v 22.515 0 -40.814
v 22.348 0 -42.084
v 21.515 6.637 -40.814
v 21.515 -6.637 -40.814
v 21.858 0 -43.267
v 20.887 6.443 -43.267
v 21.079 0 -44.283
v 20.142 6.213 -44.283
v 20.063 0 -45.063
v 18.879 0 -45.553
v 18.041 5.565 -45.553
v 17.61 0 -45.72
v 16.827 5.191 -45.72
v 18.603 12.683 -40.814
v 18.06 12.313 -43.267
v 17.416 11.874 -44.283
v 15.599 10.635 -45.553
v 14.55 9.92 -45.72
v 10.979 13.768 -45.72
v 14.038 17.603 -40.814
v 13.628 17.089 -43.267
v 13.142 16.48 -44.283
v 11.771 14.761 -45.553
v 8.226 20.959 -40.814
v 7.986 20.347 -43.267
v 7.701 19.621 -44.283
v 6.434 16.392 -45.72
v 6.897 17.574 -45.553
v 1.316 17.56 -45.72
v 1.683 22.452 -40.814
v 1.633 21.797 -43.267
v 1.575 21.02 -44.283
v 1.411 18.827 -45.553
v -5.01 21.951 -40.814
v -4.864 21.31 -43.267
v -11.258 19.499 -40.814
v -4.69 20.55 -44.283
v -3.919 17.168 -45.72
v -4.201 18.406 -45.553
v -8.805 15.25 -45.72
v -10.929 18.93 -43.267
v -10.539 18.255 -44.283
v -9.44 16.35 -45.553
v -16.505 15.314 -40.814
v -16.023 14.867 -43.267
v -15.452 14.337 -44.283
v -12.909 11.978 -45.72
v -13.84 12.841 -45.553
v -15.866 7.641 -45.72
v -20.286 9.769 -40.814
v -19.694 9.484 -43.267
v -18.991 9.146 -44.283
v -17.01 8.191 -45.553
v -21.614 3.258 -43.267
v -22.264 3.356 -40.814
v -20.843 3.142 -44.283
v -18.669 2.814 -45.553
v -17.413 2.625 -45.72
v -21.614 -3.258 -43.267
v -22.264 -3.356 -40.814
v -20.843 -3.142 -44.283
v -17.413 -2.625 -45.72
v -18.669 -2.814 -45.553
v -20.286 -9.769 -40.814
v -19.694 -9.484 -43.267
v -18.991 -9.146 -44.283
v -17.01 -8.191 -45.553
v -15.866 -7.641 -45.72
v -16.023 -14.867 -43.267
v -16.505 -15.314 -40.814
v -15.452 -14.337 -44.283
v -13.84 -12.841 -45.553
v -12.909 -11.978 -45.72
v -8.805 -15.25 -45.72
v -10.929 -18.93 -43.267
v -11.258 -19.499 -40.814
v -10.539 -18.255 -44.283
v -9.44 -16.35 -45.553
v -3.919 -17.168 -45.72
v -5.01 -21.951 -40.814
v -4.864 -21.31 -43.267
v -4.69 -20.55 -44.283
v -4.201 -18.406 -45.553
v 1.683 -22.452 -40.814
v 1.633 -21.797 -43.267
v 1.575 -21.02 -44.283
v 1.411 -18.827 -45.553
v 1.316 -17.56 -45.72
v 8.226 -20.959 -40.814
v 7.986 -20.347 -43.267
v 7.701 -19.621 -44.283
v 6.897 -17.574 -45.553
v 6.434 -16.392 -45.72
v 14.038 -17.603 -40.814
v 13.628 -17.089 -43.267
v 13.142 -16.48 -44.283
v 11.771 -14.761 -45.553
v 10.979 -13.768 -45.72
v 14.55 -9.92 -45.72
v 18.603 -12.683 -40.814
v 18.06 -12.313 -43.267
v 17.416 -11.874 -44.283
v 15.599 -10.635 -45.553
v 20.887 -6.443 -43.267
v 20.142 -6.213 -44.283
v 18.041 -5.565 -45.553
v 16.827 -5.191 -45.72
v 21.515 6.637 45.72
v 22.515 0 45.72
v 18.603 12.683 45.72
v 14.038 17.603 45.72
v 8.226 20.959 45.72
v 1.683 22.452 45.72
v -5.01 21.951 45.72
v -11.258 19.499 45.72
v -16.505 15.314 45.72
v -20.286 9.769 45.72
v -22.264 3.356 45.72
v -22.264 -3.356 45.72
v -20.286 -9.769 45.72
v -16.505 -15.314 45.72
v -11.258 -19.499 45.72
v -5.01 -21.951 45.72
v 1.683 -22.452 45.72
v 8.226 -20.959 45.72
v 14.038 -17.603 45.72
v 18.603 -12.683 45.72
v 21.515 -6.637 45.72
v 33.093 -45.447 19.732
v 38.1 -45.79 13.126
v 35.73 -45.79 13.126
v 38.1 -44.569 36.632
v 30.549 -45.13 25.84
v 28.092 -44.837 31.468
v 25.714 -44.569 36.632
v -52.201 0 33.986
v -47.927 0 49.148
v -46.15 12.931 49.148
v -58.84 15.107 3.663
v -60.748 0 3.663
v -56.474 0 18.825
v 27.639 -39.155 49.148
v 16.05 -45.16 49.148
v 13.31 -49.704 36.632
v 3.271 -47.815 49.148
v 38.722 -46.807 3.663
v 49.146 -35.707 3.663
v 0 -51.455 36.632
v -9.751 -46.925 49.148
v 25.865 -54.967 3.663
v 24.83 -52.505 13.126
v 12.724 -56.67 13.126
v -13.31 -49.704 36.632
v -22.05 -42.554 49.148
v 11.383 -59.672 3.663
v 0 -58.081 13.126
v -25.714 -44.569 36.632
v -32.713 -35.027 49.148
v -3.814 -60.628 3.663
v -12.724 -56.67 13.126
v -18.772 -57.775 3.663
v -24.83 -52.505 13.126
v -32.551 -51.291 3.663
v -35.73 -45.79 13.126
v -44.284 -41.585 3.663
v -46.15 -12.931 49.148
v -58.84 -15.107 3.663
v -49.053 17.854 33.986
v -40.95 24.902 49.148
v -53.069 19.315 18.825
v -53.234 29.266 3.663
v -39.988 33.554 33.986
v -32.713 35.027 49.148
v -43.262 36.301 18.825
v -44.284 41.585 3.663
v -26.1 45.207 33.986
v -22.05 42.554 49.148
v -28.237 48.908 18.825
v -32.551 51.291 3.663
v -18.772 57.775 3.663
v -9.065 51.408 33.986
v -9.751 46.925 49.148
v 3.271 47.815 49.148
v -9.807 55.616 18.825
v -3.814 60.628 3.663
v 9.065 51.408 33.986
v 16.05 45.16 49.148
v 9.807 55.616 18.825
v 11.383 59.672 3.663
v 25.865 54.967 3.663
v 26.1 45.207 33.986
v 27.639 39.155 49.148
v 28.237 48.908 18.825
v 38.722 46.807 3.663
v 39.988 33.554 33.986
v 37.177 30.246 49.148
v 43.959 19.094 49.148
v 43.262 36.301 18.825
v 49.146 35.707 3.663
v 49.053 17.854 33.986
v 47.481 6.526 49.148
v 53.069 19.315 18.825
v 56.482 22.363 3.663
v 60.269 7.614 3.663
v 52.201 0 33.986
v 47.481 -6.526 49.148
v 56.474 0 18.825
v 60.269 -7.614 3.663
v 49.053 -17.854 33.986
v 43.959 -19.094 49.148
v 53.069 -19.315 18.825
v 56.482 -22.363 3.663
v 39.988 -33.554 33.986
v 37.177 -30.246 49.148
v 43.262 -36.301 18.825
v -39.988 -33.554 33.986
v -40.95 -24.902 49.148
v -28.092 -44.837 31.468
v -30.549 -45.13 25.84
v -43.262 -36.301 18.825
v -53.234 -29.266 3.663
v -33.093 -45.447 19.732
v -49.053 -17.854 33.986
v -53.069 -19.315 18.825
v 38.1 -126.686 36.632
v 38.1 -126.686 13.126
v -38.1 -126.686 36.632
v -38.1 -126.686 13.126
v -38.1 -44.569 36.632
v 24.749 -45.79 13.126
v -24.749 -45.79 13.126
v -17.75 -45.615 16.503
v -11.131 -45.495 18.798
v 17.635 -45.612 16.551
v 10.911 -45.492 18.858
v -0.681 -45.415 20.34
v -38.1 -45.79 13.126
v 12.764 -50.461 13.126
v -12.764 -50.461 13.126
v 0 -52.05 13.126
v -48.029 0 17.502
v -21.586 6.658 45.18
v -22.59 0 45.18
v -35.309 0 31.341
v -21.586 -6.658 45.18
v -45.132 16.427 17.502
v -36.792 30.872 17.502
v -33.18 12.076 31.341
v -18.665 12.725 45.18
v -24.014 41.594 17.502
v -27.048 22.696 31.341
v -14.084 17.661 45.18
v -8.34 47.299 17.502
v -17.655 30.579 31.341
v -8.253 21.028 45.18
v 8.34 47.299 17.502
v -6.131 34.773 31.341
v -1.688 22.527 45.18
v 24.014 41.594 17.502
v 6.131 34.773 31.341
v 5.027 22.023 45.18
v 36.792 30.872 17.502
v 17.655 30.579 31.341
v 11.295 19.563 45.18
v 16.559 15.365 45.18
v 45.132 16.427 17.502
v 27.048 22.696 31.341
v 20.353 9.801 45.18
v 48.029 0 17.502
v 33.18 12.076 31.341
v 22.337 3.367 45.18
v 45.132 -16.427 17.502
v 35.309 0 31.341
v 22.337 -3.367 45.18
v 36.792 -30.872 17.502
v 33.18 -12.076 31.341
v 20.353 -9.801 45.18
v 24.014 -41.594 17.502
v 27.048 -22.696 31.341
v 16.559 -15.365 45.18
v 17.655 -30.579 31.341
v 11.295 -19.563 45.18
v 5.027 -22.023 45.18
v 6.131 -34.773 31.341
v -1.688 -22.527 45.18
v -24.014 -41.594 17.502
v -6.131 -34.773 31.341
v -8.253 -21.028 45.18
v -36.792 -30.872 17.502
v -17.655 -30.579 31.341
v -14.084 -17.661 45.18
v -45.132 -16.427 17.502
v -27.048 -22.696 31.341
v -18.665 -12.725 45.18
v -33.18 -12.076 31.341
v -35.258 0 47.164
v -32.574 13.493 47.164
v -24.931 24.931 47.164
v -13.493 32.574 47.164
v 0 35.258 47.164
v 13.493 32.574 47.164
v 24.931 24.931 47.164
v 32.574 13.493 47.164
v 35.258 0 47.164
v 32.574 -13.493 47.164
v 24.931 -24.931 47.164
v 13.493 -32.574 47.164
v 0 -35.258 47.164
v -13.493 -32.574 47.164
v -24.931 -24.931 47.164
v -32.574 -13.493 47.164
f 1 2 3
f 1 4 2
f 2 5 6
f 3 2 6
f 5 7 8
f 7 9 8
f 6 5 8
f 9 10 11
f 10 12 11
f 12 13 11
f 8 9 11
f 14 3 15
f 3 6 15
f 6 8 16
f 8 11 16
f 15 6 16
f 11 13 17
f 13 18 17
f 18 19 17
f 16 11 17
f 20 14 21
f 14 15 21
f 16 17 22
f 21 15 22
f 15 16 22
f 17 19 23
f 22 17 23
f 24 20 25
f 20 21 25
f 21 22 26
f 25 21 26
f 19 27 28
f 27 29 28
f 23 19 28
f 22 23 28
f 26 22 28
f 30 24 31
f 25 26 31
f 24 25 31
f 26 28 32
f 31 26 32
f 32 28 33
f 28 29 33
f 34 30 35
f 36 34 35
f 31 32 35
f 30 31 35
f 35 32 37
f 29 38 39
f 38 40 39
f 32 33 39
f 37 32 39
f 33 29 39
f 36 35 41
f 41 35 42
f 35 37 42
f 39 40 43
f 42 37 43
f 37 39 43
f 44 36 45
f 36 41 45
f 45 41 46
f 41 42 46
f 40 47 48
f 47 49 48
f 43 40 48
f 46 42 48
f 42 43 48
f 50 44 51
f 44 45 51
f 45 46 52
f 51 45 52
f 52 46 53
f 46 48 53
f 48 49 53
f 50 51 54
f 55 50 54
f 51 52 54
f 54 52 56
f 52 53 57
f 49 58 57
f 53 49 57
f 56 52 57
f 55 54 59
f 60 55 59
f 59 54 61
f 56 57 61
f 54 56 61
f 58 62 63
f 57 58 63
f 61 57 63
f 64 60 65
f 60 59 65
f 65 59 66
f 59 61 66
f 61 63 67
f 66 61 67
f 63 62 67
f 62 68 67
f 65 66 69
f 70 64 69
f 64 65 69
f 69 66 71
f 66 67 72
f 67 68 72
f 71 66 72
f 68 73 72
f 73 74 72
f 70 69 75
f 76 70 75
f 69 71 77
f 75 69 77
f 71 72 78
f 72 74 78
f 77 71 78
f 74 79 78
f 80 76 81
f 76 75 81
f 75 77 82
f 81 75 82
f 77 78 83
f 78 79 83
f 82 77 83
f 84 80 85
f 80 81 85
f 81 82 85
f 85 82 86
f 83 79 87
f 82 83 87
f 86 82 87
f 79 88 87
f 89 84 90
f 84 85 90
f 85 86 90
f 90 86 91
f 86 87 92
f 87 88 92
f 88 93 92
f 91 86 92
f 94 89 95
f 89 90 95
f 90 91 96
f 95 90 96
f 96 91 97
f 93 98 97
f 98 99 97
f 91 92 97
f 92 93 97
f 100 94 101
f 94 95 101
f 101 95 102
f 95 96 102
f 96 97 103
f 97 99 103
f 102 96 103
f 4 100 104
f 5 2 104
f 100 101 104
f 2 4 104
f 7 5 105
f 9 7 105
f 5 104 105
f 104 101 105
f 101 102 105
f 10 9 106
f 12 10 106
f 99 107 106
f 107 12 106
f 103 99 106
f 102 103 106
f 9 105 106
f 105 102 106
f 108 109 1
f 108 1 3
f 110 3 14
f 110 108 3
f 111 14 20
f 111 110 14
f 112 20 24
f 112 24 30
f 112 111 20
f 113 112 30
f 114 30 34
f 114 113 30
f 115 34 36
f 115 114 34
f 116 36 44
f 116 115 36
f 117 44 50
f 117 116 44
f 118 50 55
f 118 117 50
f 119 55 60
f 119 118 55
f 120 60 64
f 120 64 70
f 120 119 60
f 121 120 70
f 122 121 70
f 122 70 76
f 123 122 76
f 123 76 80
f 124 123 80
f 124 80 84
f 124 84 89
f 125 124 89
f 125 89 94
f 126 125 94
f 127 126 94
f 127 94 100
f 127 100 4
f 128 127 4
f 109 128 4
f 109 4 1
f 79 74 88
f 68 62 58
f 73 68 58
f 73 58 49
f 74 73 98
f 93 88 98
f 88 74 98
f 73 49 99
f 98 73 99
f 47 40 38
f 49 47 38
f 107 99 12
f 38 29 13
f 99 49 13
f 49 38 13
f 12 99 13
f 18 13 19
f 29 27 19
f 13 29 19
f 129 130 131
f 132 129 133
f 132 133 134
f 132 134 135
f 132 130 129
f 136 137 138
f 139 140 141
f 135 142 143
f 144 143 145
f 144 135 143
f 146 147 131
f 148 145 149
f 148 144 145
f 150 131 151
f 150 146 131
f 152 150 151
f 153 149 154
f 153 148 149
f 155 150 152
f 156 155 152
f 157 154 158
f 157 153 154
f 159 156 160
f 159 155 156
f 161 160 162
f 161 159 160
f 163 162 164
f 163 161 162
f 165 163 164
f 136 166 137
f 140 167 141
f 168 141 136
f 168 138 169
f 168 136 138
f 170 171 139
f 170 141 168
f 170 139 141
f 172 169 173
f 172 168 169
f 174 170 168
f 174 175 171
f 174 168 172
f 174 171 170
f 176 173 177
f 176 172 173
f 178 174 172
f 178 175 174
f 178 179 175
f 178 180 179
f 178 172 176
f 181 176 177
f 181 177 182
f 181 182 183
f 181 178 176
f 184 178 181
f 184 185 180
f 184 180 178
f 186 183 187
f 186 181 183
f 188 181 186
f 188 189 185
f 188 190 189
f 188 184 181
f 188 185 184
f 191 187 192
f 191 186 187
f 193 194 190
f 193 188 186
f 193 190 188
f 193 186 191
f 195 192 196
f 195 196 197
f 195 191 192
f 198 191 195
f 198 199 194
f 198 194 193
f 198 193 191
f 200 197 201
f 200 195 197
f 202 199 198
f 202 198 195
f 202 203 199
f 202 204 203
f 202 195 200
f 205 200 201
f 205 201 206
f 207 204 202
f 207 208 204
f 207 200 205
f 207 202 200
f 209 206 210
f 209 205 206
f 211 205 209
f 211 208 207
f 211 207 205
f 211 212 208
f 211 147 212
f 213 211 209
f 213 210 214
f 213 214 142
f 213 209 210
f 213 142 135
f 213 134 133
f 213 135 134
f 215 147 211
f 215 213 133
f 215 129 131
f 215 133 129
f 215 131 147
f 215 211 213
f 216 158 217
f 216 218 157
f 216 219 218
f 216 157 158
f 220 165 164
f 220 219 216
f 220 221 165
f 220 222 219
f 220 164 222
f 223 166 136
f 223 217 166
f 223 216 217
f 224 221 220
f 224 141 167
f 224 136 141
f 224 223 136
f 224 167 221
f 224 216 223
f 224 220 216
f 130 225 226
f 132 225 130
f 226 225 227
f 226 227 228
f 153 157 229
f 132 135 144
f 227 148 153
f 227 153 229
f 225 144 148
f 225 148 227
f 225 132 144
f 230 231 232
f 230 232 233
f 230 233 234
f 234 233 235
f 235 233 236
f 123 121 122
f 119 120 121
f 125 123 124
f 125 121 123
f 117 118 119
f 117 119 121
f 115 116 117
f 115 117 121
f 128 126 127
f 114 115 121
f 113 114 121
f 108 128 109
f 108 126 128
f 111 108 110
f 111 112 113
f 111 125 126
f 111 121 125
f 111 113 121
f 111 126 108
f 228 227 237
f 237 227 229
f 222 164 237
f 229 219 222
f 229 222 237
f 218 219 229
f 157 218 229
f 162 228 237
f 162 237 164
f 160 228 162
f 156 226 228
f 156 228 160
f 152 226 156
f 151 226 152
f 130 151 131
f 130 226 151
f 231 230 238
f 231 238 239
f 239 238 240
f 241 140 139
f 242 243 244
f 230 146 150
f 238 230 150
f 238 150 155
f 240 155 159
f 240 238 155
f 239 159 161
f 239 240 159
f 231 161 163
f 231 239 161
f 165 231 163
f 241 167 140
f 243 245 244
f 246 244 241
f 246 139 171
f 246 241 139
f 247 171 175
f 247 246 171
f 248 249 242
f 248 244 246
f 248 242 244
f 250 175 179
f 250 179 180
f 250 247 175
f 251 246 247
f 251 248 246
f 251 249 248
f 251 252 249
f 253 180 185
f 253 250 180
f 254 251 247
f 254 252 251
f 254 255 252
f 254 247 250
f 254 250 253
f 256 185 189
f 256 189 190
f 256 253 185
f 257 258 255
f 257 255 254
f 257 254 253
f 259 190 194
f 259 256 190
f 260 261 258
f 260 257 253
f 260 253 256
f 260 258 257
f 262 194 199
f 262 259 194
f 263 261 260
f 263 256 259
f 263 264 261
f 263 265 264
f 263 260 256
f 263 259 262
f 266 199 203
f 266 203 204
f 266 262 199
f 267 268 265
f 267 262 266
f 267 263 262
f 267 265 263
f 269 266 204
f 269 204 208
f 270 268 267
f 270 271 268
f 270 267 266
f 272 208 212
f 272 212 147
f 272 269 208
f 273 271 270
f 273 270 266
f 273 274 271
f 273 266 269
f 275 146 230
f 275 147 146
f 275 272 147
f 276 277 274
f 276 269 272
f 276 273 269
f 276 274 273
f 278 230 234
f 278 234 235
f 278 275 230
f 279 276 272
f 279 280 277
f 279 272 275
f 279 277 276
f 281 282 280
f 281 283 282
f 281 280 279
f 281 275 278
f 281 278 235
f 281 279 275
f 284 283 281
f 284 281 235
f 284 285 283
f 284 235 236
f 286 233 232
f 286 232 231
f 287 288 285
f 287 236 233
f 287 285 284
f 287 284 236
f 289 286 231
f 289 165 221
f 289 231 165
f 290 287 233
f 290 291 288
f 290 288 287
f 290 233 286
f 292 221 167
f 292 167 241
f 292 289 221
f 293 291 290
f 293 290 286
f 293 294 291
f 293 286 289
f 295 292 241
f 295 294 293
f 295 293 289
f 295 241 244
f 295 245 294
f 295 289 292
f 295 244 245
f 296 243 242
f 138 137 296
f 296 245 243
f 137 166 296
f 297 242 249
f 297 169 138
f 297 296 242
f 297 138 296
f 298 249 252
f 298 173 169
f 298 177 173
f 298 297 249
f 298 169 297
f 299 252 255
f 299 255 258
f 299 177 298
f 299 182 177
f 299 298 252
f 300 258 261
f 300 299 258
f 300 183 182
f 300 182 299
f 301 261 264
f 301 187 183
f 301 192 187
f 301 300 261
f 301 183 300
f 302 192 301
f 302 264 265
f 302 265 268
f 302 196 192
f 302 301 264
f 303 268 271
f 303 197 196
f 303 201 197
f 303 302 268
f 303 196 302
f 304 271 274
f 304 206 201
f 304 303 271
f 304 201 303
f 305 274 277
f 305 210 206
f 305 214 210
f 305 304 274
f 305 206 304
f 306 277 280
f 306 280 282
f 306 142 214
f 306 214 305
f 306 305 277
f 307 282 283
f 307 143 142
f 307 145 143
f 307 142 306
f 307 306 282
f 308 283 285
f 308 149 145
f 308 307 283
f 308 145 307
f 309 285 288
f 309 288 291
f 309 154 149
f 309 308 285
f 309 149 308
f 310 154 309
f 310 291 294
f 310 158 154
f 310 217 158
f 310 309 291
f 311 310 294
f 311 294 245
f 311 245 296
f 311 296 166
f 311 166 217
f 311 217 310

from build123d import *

# Parameters (mm, degrees)
F3_R     = 22.515409418
F4_DEPTH = 45.72
F5_R     = 4.9056819587
F7_DEPTH = 38.1


# Not quite as in the source:
# - a variable given as a bare number and used for a length is read in inches; the dataset says mm whatever the document's units were


with BuildPart() as f2:
    # F1 (on Front) → F2 (revolve)
    with BuildSketch(Plane.XZ):
        Polygon((-22.5897803903, 45.1795645058), (-47.9269698262, 49.1480380297), (-60.7481971383, 3.6632046103), align=None)
    revolve(axis=Axis((0, 0, 28.5424944013), (0, 0, -1)))

    # F6 (on Right) → F7 (join, symmetric)
    with BuildSketch(Plane.YZ):
        Polygon((-45.7901023328, 13.1264971569), (-44.5690304041, 36.6320833564), (-126.6859471798, 36.6320833564), (-126.6859471798, 13.1264971569), align=None)
    extrude(amount=F7_DEPTH, both=True)


with BuildPart() as f4:
    # F3 (on Top) → F4 (new body, symmetric)
    with BuildSketch(Plane.XY):
        Circle(F3_R)
    extrude(amount=F4_DEPTH, both=True)

    # F5
    f5_edges = [f4.edges().sort_by_distance(p)[0] for p in [
        (-22.515409, 0, -45.72),
    ]]
    fillet(f5_edges, radius=F5_R)


solid = Compound([f2.part, f4.part])
